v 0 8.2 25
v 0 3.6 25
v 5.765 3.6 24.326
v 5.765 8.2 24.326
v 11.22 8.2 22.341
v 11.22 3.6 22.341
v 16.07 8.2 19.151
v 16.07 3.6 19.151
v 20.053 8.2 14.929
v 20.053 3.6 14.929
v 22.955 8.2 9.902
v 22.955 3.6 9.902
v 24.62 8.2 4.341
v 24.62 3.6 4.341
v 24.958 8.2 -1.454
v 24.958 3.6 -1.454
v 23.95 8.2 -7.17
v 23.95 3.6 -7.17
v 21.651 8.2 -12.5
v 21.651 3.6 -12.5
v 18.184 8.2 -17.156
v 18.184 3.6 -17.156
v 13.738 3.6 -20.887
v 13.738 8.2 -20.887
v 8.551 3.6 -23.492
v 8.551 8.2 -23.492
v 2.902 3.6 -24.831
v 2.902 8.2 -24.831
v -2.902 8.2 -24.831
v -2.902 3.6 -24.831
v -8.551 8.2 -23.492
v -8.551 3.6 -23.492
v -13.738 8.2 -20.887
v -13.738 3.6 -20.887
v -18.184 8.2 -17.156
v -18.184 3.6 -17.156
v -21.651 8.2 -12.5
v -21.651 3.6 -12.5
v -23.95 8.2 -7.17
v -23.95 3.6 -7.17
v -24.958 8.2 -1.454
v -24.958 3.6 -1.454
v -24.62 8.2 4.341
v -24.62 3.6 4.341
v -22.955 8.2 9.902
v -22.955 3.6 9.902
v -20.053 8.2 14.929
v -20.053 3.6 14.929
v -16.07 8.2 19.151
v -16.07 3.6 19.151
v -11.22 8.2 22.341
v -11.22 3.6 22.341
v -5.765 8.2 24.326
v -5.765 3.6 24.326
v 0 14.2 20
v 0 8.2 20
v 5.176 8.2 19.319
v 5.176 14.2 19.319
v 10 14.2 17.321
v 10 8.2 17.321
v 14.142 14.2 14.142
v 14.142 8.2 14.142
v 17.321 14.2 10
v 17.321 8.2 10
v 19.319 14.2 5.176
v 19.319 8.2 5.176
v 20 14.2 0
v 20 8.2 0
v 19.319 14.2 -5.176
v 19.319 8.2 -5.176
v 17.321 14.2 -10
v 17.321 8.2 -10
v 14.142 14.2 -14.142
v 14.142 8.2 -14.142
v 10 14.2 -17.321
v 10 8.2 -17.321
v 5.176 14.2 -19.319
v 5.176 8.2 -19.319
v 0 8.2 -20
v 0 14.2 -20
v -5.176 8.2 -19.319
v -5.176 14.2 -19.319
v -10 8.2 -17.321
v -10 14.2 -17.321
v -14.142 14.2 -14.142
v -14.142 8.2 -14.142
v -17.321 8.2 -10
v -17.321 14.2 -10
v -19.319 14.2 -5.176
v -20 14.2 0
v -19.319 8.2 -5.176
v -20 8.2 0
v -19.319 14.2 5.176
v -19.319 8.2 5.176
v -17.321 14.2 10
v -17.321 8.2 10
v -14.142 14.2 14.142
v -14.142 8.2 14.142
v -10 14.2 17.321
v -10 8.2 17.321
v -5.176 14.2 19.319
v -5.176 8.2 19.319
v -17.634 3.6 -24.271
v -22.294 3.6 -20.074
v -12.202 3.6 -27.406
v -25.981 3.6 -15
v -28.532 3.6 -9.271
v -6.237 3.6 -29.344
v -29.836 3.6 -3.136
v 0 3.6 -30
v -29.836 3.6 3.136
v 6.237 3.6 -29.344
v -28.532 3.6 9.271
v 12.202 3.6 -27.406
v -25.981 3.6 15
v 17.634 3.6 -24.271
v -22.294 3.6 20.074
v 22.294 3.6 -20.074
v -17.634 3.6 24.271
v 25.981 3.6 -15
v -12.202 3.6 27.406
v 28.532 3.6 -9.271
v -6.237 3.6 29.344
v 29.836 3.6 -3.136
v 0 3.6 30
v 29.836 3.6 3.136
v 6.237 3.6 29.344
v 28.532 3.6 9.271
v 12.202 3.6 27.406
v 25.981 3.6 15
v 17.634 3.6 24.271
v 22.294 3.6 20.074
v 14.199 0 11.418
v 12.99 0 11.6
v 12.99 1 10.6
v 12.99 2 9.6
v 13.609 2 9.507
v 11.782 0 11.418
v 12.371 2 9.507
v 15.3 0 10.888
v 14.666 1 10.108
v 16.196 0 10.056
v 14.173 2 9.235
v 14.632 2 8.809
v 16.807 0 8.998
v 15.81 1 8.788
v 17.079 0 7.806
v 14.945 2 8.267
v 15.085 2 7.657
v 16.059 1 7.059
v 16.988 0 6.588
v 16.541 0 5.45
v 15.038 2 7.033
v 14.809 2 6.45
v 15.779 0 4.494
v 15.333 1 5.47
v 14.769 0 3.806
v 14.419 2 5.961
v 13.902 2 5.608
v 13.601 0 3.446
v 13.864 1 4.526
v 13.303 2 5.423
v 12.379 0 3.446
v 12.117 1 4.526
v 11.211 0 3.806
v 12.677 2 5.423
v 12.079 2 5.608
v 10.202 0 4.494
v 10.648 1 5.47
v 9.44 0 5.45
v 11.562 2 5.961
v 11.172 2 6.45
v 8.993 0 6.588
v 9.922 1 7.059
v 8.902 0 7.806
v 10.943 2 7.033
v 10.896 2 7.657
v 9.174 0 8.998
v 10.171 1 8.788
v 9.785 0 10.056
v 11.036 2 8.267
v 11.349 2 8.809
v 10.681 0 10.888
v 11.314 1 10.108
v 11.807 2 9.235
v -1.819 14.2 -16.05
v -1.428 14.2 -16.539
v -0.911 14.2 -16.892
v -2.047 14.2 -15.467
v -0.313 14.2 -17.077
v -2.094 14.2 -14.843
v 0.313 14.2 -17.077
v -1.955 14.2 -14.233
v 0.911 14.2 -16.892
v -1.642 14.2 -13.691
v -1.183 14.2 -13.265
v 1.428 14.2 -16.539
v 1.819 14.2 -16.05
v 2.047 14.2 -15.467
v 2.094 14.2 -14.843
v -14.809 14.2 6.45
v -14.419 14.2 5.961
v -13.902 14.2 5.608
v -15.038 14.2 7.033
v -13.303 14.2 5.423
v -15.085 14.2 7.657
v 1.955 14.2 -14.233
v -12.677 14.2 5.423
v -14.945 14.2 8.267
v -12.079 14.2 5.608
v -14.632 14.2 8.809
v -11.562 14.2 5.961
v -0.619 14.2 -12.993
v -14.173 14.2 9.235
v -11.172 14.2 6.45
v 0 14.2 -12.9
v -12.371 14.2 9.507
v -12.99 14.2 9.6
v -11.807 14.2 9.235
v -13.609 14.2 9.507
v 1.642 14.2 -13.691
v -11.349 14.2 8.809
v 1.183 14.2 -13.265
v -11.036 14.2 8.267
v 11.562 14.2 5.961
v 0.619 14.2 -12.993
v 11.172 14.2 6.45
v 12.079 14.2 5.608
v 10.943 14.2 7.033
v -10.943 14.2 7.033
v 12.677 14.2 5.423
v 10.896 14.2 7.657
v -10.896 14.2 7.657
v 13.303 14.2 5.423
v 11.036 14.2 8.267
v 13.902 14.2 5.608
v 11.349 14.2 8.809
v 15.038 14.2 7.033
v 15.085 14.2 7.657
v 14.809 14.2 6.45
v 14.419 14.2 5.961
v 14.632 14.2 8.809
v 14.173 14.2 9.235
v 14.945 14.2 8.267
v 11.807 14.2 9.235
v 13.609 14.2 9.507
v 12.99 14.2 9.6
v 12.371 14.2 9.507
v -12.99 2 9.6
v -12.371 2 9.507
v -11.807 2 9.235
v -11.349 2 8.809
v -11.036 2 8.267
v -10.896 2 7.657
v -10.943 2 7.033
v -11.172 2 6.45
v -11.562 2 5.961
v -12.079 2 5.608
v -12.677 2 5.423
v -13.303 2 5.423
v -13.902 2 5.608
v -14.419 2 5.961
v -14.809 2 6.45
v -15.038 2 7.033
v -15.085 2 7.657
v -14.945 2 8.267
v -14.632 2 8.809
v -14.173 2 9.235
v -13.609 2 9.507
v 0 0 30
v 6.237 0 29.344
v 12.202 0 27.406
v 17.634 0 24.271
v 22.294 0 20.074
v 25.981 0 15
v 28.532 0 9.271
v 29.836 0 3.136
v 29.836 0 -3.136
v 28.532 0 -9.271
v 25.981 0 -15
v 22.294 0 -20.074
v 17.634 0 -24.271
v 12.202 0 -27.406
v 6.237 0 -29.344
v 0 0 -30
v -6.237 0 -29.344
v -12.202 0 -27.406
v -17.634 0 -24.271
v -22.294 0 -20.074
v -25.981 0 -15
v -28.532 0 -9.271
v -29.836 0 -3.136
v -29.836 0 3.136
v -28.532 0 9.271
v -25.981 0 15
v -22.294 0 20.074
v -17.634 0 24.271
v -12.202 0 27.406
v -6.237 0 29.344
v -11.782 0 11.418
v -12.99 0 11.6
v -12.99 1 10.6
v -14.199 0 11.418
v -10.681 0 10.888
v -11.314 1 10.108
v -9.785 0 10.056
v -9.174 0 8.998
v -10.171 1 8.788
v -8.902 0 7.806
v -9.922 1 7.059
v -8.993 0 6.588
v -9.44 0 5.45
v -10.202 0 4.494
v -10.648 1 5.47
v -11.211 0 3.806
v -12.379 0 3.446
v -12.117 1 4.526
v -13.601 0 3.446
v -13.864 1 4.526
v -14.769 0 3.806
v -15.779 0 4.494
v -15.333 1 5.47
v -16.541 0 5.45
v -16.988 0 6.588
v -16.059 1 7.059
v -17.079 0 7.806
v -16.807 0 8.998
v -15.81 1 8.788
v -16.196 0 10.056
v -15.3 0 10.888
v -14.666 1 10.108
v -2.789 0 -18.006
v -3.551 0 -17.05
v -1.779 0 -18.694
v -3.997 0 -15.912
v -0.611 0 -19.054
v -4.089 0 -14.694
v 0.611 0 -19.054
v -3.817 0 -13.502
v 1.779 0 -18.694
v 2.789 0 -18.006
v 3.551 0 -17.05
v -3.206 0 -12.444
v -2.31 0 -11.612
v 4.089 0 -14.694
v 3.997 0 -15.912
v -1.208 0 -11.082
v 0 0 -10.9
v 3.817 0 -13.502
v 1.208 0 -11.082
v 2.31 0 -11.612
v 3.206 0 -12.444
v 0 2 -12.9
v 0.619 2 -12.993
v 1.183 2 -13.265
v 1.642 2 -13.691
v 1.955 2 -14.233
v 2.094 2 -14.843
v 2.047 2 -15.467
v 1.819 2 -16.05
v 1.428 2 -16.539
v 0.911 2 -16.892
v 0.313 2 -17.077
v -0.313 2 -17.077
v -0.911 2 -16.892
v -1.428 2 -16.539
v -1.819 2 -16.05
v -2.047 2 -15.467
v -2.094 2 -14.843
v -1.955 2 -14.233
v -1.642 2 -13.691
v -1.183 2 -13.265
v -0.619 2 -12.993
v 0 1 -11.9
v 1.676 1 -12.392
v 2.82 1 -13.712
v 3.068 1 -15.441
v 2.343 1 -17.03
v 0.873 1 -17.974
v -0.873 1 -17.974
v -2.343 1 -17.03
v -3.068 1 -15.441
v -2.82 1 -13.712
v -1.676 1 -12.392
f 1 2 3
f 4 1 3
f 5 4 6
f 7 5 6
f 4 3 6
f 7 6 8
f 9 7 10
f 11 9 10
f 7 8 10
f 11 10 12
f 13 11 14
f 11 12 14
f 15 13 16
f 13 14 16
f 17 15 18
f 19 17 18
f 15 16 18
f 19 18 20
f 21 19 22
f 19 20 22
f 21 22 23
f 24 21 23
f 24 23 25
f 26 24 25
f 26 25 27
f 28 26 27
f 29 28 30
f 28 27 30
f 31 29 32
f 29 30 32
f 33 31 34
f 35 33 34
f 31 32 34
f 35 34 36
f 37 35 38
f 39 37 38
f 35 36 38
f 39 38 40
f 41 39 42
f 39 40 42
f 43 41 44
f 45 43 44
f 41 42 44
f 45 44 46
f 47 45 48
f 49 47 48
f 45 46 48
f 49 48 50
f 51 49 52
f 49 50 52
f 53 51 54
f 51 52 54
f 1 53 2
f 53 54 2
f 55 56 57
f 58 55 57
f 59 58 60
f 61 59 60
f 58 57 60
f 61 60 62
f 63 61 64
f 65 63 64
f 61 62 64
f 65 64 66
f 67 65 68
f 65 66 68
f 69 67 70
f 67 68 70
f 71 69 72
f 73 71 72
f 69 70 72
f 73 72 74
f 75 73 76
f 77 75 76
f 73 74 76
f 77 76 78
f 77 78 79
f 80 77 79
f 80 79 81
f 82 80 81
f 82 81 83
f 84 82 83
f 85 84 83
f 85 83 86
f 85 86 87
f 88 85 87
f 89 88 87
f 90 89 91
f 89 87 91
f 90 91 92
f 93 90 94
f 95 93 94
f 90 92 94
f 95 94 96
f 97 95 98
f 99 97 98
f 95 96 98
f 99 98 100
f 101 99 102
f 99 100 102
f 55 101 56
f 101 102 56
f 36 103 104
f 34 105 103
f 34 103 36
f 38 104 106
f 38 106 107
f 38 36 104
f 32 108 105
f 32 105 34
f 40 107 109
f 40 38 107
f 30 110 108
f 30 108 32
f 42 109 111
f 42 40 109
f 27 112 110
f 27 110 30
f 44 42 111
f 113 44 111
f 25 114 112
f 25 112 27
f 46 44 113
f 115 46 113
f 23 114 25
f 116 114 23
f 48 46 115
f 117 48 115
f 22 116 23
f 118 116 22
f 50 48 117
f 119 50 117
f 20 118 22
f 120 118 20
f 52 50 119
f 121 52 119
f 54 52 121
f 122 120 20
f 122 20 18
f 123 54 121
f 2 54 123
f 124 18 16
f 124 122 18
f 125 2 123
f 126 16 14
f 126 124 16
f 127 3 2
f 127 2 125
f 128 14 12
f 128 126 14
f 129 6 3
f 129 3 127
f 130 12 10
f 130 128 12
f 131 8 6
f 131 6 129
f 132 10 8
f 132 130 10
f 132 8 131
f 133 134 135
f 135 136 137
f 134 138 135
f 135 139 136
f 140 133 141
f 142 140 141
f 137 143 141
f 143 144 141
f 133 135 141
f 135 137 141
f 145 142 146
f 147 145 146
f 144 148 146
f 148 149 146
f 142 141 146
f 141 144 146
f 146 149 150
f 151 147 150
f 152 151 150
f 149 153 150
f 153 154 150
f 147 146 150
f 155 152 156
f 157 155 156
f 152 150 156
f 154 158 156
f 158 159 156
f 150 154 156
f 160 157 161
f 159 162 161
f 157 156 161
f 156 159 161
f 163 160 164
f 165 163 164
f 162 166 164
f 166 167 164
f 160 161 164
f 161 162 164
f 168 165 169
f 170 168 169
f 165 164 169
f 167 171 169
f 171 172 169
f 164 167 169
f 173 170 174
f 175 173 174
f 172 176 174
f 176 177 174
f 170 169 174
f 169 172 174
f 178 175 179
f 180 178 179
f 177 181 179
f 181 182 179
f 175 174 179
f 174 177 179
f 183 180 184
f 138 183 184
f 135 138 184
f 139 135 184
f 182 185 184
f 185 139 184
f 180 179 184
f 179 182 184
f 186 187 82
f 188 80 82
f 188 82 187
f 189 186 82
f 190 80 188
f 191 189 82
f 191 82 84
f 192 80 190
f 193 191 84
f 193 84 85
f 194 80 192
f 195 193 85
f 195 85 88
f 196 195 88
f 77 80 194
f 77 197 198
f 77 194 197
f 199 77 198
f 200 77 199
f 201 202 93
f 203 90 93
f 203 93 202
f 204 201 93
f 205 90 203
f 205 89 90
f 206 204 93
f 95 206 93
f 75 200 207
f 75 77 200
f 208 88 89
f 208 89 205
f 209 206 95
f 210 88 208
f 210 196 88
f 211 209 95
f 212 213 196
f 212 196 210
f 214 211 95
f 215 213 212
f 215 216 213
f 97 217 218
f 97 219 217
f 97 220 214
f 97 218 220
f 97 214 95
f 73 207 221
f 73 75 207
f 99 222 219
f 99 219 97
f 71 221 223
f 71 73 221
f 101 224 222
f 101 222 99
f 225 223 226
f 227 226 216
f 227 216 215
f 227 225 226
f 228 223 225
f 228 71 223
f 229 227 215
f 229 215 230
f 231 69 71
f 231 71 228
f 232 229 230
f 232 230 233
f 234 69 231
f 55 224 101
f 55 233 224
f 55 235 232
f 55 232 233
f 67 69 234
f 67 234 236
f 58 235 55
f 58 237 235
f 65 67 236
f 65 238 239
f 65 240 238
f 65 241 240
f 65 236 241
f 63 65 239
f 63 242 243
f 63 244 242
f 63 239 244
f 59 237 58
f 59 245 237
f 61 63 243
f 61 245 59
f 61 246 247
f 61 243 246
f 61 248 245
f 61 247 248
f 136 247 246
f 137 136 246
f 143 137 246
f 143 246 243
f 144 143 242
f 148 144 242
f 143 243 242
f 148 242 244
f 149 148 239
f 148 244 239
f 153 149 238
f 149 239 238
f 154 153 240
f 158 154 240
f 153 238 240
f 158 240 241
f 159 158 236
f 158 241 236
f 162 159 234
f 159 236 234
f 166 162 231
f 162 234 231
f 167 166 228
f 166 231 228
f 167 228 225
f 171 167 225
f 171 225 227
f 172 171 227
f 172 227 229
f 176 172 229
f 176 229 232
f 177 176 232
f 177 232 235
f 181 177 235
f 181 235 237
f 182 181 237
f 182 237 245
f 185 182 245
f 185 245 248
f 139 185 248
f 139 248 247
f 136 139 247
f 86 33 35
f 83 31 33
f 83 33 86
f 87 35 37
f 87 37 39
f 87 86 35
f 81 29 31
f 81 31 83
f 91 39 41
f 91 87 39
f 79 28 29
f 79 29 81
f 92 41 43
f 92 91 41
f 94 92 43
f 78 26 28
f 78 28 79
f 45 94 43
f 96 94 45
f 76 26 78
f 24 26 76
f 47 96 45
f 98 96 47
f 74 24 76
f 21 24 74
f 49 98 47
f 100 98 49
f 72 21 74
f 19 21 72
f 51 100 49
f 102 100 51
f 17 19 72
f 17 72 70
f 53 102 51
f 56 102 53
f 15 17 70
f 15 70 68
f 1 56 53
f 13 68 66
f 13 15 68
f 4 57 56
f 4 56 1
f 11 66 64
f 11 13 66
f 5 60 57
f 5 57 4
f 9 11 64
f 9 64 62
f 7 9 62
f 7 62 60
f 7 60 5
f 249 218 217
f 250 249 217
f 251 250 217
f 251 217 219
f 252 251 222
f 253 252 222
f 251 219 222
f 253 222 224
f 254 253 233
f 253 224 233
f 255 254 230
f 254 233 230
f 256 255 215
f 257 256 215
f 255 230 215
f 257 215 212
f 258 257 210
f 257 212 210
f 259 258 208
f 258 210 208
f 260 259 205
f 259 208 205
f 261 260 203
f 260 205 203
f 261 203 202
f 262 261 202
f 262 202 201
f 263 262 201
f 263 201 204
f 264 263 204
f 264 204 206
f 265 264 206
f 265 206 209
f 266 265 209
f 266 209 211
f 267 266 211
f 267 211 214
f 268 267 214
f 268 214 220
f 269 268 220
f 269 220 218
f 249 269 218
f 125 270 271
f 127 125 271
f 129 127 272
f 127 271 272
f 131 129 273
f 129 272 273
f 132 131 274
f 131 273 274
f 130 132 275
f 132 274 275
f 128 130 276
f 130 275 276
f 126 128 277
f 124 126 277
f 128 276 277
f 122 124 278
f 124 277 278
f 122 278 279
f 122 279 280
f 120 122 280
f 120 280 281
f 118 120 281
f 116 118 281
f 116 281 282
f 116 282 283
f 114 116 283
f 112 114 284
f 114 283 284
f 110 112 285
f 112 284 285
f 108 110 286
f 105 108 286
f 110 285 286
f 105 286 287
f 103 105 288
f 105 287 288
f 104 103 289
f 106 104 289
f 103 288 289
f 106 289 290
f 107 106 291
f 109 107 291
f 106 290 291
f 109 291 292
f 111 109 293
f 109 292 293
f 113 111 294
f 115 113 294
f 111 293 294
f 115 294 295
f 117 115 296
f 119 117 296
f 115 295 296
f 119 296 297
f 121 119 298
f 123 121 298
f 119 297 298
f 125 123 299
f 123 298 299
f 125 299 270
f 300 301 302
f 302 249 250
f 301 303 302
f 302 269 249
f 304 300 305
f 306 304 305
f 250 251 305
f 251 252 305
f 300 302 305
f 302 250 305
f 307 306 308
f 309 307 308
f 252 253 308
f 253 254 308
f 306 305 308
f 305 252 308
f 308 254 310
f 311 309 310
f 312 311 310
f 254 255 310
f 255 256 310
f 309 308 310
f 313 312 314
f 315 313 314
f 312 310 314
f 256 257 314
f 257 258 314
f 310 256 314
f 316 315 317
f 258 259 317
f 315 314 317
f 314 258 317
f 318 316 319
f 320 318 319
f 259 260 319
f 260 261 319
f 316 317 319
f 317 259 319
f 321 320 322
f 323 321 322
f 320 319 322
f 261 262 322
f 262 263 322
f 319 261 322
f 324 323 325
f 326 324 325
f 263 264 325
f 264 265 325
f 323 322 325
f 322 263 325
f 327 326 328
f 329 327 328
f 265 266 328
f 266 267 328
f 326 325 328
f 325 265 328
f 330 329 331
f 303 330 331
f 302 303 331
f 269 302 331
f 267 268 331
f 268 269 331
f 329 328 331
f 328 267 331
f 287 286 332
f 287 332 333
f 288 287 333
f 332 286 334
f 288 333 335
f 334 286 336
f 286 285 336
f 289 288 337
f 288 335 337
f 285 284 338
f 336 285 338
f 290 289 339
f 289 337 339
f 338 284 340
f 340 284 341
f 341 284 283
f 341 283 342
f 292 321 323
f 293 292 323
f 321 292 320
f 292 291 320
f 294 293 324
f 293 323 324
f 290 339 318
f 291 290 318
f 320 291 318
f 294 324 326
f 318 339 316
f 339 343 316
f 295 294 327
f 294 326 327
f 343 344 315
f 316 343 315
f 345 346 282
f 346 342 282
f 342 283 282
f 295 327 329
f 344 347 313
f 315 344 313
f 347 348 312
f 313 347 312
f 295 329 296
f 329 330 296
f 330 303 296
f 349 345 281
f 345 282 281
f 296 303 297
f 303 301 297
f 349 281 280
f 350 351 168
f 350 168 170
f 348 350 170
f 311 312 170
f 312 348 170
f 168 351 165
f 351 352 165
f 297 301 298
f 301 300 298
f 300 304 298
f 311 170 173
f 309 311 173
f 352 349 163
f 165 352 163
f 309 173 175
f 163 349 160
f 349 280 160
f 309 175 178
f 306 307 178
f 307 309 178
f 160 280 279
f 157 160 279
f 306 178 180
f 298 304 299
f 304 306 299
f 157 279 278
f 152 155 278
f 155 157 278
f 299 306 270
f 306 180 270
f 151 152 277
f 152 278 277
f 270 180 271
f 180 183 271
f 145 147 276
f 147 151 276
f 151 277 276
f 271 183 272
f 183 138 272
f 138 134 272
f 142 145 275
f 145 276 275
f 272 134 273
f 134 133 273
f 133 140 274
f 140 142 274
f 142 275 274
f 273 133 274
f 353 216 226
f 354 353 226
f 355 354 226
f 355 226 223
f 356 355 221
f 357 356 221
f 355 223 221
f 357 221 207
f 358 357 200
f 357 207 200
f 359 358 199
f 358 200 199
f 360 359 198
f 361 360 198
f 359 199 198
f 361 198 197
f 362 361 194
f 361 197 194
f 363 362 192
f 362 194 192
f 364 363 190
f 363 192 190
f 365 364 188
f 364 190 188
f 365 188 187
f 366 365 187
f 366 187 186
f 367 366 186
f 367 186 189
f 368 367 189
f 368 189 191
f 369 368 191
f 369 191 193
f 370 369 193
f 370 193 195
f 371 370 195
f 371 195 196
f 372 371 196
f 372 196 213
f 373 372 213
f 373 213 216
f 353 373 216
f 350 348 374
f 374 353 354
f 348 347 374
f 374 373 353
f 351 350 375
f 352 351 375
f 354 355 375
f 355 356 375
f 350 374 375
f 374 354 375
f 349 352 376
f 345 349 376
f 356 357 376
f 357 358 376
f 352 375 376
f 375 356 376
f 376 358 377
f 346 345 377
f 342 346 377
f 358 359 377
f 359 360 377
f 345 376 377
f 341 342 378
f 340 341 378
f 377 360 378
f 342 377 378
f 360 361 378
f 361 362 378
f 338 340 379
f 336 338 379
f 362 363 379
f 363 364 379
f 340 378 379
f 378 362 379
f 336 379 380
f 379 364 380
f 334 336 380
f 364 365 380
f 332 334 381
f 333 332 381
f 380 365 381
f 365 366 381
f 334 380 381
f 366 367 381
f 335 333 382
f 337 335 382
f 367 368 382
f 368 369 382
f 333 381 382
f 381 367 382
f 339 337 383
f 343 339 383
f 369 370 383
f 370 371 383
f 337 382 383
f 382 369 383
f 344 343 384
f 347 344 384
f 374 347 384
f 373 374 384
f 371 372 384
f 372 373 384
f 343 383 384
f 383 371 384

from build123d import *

# Parameters (mm, degrees)
SKETCH1_R           = 30
BOSS_EXTRUDE1_DEPTH = 3.6
SKETCH2_R           = 25
BOSS_EXTRUDE2_DEPTH = 4.6
SKETCH3_R           = 20
BOSS_EXTRUDE3_DEPTH = 6
CUT_EXTRUDE1_REACH  = 46.74
SKETCH4_R           = 2.1
CHAMFER1_SIZE       = 2


with BuildPart() as part:
    # Sketch1 → Boss-Extrude1 (new body)
    with BuildSketch(Plane(origin=(0, 0, 0), x_dir=(1, 0, 0), z_dir=(0, 1, 0))):
        with Locations(Location((0, 0, 0), (0, 0, 270))):
            Circle(SKETCH1_R)
    extrude(amount=BOSS_EXTRUDE1_DEPTH)

    # Sketch2 → Boss-Extrude2 (add)
    with BuildSketch(Plane(origin=(0, 3.6, 0), x_dir=(1, 0, 0), z_dir=(0, 1, 0))):
        with Locations(Location((0, 0, 0), (0, 0, 270))):
            Circle(SKETCH2_R)
    extrude(amount=BOSS_EXTRUDE2_DEPTH)

    # Sketch3 → Boss-Extrude3 (add)
    with BuildSketch(Plane(origin=(0, 8.2, 0), x_dir=(1, 0, 0), z_dir=(0, 1, 0))):
        with Locations(Location((0, 0, 0), (0, 0, 270))):
            Circle(SKETCH3_R)
    extrude(amount=BOSS_EXTRUDE3_DEPTH)

    # Sketch4 → Cut-Extrude1 (cut, up to next)
    with BuildSketch(Plane(origin=(0, 14.2, 0), x_dir=(1, 0, 0), z_dir=(0, 1, 0)), mode=Mode.PRIVATE) as cut_extrude1_sk1:
        with Locations(Location((0, 15, 0), (0, 0, 270))):
            Circle(SKETCH4_R)
    cut_extrude1_tool1 = extrude(cut_extrude1_sk1.sketch, amount=-CUT_EXTRUDE1_REACH, mode=Mode.PRIVATE) & part.part
    # Sketch4 → Cut-Extrude1 (cut, up to next)
    with BuildSketch(Plane(origin=(0, 14.2, 0), x_dir=(1, 0, 0), z_dir=(0, 1, 0)), mode=Mode.PRIVATE) as cut_extrude1_sk2:
        with Locations(Location((12.990381057, -7.5, 0), (0, 0, 270))):
            Circle(SKETCH4_R)
    cut_extrude1_tool2 = extrude(cut_extrude1_sk2.sketch, amount=-CUT_EXTRUDE1_REACH, mode=Mode.PRIVATE) & part.part
    # Sketch4 → Cut-Extrude1 (cut, up to next)
    with BuildSketch(Plane(origin=(0, 14.2, 0), x_dir=(1, 0, 0), z_dir=(0, 1, 0)), mode=Mode.PRIVATE) as cut_extrude1_sk3:
        with Locations(Location((-12.990381057, -7.5, 0), (0, 0, 270))):
            Circle(SKETCH4_R)
    cut_extrude1_tool3 = extrude(cut_extrude1_sk3.sketch, amount=-CUT_EXTRUDE1_REACH, mode=Mode.PRIVATE) & part.part
    add(cut_extrude1_tool1.solids().sort_by_distance((0, 14.2, -15))[0], mode=Mode.SUBTRACT)
    add(cut_extrude1_tool2.solids().sort_by_distance((12.990381, 14.2, 7.5))[0], mode=Mode.SUBTRACT)
    add(cut_extrude1_tool3.solids().sort_by_distance((-12.990381, 14.2, 7.5))[0], mode=Mode.SUBTRACT)

    # Chamfer1
    chamfer1_edges = [part.edges().sort_by_distance(p)[0] for p in [
        (0, 0, -17.1),
        (12.990381057, 0, 5.4),
        (-12.990381057, 0, 5.4),
    ]]
    chamfer(chamfer1_edges, length=CHAMFER1_SIZE)


solid = part.part
